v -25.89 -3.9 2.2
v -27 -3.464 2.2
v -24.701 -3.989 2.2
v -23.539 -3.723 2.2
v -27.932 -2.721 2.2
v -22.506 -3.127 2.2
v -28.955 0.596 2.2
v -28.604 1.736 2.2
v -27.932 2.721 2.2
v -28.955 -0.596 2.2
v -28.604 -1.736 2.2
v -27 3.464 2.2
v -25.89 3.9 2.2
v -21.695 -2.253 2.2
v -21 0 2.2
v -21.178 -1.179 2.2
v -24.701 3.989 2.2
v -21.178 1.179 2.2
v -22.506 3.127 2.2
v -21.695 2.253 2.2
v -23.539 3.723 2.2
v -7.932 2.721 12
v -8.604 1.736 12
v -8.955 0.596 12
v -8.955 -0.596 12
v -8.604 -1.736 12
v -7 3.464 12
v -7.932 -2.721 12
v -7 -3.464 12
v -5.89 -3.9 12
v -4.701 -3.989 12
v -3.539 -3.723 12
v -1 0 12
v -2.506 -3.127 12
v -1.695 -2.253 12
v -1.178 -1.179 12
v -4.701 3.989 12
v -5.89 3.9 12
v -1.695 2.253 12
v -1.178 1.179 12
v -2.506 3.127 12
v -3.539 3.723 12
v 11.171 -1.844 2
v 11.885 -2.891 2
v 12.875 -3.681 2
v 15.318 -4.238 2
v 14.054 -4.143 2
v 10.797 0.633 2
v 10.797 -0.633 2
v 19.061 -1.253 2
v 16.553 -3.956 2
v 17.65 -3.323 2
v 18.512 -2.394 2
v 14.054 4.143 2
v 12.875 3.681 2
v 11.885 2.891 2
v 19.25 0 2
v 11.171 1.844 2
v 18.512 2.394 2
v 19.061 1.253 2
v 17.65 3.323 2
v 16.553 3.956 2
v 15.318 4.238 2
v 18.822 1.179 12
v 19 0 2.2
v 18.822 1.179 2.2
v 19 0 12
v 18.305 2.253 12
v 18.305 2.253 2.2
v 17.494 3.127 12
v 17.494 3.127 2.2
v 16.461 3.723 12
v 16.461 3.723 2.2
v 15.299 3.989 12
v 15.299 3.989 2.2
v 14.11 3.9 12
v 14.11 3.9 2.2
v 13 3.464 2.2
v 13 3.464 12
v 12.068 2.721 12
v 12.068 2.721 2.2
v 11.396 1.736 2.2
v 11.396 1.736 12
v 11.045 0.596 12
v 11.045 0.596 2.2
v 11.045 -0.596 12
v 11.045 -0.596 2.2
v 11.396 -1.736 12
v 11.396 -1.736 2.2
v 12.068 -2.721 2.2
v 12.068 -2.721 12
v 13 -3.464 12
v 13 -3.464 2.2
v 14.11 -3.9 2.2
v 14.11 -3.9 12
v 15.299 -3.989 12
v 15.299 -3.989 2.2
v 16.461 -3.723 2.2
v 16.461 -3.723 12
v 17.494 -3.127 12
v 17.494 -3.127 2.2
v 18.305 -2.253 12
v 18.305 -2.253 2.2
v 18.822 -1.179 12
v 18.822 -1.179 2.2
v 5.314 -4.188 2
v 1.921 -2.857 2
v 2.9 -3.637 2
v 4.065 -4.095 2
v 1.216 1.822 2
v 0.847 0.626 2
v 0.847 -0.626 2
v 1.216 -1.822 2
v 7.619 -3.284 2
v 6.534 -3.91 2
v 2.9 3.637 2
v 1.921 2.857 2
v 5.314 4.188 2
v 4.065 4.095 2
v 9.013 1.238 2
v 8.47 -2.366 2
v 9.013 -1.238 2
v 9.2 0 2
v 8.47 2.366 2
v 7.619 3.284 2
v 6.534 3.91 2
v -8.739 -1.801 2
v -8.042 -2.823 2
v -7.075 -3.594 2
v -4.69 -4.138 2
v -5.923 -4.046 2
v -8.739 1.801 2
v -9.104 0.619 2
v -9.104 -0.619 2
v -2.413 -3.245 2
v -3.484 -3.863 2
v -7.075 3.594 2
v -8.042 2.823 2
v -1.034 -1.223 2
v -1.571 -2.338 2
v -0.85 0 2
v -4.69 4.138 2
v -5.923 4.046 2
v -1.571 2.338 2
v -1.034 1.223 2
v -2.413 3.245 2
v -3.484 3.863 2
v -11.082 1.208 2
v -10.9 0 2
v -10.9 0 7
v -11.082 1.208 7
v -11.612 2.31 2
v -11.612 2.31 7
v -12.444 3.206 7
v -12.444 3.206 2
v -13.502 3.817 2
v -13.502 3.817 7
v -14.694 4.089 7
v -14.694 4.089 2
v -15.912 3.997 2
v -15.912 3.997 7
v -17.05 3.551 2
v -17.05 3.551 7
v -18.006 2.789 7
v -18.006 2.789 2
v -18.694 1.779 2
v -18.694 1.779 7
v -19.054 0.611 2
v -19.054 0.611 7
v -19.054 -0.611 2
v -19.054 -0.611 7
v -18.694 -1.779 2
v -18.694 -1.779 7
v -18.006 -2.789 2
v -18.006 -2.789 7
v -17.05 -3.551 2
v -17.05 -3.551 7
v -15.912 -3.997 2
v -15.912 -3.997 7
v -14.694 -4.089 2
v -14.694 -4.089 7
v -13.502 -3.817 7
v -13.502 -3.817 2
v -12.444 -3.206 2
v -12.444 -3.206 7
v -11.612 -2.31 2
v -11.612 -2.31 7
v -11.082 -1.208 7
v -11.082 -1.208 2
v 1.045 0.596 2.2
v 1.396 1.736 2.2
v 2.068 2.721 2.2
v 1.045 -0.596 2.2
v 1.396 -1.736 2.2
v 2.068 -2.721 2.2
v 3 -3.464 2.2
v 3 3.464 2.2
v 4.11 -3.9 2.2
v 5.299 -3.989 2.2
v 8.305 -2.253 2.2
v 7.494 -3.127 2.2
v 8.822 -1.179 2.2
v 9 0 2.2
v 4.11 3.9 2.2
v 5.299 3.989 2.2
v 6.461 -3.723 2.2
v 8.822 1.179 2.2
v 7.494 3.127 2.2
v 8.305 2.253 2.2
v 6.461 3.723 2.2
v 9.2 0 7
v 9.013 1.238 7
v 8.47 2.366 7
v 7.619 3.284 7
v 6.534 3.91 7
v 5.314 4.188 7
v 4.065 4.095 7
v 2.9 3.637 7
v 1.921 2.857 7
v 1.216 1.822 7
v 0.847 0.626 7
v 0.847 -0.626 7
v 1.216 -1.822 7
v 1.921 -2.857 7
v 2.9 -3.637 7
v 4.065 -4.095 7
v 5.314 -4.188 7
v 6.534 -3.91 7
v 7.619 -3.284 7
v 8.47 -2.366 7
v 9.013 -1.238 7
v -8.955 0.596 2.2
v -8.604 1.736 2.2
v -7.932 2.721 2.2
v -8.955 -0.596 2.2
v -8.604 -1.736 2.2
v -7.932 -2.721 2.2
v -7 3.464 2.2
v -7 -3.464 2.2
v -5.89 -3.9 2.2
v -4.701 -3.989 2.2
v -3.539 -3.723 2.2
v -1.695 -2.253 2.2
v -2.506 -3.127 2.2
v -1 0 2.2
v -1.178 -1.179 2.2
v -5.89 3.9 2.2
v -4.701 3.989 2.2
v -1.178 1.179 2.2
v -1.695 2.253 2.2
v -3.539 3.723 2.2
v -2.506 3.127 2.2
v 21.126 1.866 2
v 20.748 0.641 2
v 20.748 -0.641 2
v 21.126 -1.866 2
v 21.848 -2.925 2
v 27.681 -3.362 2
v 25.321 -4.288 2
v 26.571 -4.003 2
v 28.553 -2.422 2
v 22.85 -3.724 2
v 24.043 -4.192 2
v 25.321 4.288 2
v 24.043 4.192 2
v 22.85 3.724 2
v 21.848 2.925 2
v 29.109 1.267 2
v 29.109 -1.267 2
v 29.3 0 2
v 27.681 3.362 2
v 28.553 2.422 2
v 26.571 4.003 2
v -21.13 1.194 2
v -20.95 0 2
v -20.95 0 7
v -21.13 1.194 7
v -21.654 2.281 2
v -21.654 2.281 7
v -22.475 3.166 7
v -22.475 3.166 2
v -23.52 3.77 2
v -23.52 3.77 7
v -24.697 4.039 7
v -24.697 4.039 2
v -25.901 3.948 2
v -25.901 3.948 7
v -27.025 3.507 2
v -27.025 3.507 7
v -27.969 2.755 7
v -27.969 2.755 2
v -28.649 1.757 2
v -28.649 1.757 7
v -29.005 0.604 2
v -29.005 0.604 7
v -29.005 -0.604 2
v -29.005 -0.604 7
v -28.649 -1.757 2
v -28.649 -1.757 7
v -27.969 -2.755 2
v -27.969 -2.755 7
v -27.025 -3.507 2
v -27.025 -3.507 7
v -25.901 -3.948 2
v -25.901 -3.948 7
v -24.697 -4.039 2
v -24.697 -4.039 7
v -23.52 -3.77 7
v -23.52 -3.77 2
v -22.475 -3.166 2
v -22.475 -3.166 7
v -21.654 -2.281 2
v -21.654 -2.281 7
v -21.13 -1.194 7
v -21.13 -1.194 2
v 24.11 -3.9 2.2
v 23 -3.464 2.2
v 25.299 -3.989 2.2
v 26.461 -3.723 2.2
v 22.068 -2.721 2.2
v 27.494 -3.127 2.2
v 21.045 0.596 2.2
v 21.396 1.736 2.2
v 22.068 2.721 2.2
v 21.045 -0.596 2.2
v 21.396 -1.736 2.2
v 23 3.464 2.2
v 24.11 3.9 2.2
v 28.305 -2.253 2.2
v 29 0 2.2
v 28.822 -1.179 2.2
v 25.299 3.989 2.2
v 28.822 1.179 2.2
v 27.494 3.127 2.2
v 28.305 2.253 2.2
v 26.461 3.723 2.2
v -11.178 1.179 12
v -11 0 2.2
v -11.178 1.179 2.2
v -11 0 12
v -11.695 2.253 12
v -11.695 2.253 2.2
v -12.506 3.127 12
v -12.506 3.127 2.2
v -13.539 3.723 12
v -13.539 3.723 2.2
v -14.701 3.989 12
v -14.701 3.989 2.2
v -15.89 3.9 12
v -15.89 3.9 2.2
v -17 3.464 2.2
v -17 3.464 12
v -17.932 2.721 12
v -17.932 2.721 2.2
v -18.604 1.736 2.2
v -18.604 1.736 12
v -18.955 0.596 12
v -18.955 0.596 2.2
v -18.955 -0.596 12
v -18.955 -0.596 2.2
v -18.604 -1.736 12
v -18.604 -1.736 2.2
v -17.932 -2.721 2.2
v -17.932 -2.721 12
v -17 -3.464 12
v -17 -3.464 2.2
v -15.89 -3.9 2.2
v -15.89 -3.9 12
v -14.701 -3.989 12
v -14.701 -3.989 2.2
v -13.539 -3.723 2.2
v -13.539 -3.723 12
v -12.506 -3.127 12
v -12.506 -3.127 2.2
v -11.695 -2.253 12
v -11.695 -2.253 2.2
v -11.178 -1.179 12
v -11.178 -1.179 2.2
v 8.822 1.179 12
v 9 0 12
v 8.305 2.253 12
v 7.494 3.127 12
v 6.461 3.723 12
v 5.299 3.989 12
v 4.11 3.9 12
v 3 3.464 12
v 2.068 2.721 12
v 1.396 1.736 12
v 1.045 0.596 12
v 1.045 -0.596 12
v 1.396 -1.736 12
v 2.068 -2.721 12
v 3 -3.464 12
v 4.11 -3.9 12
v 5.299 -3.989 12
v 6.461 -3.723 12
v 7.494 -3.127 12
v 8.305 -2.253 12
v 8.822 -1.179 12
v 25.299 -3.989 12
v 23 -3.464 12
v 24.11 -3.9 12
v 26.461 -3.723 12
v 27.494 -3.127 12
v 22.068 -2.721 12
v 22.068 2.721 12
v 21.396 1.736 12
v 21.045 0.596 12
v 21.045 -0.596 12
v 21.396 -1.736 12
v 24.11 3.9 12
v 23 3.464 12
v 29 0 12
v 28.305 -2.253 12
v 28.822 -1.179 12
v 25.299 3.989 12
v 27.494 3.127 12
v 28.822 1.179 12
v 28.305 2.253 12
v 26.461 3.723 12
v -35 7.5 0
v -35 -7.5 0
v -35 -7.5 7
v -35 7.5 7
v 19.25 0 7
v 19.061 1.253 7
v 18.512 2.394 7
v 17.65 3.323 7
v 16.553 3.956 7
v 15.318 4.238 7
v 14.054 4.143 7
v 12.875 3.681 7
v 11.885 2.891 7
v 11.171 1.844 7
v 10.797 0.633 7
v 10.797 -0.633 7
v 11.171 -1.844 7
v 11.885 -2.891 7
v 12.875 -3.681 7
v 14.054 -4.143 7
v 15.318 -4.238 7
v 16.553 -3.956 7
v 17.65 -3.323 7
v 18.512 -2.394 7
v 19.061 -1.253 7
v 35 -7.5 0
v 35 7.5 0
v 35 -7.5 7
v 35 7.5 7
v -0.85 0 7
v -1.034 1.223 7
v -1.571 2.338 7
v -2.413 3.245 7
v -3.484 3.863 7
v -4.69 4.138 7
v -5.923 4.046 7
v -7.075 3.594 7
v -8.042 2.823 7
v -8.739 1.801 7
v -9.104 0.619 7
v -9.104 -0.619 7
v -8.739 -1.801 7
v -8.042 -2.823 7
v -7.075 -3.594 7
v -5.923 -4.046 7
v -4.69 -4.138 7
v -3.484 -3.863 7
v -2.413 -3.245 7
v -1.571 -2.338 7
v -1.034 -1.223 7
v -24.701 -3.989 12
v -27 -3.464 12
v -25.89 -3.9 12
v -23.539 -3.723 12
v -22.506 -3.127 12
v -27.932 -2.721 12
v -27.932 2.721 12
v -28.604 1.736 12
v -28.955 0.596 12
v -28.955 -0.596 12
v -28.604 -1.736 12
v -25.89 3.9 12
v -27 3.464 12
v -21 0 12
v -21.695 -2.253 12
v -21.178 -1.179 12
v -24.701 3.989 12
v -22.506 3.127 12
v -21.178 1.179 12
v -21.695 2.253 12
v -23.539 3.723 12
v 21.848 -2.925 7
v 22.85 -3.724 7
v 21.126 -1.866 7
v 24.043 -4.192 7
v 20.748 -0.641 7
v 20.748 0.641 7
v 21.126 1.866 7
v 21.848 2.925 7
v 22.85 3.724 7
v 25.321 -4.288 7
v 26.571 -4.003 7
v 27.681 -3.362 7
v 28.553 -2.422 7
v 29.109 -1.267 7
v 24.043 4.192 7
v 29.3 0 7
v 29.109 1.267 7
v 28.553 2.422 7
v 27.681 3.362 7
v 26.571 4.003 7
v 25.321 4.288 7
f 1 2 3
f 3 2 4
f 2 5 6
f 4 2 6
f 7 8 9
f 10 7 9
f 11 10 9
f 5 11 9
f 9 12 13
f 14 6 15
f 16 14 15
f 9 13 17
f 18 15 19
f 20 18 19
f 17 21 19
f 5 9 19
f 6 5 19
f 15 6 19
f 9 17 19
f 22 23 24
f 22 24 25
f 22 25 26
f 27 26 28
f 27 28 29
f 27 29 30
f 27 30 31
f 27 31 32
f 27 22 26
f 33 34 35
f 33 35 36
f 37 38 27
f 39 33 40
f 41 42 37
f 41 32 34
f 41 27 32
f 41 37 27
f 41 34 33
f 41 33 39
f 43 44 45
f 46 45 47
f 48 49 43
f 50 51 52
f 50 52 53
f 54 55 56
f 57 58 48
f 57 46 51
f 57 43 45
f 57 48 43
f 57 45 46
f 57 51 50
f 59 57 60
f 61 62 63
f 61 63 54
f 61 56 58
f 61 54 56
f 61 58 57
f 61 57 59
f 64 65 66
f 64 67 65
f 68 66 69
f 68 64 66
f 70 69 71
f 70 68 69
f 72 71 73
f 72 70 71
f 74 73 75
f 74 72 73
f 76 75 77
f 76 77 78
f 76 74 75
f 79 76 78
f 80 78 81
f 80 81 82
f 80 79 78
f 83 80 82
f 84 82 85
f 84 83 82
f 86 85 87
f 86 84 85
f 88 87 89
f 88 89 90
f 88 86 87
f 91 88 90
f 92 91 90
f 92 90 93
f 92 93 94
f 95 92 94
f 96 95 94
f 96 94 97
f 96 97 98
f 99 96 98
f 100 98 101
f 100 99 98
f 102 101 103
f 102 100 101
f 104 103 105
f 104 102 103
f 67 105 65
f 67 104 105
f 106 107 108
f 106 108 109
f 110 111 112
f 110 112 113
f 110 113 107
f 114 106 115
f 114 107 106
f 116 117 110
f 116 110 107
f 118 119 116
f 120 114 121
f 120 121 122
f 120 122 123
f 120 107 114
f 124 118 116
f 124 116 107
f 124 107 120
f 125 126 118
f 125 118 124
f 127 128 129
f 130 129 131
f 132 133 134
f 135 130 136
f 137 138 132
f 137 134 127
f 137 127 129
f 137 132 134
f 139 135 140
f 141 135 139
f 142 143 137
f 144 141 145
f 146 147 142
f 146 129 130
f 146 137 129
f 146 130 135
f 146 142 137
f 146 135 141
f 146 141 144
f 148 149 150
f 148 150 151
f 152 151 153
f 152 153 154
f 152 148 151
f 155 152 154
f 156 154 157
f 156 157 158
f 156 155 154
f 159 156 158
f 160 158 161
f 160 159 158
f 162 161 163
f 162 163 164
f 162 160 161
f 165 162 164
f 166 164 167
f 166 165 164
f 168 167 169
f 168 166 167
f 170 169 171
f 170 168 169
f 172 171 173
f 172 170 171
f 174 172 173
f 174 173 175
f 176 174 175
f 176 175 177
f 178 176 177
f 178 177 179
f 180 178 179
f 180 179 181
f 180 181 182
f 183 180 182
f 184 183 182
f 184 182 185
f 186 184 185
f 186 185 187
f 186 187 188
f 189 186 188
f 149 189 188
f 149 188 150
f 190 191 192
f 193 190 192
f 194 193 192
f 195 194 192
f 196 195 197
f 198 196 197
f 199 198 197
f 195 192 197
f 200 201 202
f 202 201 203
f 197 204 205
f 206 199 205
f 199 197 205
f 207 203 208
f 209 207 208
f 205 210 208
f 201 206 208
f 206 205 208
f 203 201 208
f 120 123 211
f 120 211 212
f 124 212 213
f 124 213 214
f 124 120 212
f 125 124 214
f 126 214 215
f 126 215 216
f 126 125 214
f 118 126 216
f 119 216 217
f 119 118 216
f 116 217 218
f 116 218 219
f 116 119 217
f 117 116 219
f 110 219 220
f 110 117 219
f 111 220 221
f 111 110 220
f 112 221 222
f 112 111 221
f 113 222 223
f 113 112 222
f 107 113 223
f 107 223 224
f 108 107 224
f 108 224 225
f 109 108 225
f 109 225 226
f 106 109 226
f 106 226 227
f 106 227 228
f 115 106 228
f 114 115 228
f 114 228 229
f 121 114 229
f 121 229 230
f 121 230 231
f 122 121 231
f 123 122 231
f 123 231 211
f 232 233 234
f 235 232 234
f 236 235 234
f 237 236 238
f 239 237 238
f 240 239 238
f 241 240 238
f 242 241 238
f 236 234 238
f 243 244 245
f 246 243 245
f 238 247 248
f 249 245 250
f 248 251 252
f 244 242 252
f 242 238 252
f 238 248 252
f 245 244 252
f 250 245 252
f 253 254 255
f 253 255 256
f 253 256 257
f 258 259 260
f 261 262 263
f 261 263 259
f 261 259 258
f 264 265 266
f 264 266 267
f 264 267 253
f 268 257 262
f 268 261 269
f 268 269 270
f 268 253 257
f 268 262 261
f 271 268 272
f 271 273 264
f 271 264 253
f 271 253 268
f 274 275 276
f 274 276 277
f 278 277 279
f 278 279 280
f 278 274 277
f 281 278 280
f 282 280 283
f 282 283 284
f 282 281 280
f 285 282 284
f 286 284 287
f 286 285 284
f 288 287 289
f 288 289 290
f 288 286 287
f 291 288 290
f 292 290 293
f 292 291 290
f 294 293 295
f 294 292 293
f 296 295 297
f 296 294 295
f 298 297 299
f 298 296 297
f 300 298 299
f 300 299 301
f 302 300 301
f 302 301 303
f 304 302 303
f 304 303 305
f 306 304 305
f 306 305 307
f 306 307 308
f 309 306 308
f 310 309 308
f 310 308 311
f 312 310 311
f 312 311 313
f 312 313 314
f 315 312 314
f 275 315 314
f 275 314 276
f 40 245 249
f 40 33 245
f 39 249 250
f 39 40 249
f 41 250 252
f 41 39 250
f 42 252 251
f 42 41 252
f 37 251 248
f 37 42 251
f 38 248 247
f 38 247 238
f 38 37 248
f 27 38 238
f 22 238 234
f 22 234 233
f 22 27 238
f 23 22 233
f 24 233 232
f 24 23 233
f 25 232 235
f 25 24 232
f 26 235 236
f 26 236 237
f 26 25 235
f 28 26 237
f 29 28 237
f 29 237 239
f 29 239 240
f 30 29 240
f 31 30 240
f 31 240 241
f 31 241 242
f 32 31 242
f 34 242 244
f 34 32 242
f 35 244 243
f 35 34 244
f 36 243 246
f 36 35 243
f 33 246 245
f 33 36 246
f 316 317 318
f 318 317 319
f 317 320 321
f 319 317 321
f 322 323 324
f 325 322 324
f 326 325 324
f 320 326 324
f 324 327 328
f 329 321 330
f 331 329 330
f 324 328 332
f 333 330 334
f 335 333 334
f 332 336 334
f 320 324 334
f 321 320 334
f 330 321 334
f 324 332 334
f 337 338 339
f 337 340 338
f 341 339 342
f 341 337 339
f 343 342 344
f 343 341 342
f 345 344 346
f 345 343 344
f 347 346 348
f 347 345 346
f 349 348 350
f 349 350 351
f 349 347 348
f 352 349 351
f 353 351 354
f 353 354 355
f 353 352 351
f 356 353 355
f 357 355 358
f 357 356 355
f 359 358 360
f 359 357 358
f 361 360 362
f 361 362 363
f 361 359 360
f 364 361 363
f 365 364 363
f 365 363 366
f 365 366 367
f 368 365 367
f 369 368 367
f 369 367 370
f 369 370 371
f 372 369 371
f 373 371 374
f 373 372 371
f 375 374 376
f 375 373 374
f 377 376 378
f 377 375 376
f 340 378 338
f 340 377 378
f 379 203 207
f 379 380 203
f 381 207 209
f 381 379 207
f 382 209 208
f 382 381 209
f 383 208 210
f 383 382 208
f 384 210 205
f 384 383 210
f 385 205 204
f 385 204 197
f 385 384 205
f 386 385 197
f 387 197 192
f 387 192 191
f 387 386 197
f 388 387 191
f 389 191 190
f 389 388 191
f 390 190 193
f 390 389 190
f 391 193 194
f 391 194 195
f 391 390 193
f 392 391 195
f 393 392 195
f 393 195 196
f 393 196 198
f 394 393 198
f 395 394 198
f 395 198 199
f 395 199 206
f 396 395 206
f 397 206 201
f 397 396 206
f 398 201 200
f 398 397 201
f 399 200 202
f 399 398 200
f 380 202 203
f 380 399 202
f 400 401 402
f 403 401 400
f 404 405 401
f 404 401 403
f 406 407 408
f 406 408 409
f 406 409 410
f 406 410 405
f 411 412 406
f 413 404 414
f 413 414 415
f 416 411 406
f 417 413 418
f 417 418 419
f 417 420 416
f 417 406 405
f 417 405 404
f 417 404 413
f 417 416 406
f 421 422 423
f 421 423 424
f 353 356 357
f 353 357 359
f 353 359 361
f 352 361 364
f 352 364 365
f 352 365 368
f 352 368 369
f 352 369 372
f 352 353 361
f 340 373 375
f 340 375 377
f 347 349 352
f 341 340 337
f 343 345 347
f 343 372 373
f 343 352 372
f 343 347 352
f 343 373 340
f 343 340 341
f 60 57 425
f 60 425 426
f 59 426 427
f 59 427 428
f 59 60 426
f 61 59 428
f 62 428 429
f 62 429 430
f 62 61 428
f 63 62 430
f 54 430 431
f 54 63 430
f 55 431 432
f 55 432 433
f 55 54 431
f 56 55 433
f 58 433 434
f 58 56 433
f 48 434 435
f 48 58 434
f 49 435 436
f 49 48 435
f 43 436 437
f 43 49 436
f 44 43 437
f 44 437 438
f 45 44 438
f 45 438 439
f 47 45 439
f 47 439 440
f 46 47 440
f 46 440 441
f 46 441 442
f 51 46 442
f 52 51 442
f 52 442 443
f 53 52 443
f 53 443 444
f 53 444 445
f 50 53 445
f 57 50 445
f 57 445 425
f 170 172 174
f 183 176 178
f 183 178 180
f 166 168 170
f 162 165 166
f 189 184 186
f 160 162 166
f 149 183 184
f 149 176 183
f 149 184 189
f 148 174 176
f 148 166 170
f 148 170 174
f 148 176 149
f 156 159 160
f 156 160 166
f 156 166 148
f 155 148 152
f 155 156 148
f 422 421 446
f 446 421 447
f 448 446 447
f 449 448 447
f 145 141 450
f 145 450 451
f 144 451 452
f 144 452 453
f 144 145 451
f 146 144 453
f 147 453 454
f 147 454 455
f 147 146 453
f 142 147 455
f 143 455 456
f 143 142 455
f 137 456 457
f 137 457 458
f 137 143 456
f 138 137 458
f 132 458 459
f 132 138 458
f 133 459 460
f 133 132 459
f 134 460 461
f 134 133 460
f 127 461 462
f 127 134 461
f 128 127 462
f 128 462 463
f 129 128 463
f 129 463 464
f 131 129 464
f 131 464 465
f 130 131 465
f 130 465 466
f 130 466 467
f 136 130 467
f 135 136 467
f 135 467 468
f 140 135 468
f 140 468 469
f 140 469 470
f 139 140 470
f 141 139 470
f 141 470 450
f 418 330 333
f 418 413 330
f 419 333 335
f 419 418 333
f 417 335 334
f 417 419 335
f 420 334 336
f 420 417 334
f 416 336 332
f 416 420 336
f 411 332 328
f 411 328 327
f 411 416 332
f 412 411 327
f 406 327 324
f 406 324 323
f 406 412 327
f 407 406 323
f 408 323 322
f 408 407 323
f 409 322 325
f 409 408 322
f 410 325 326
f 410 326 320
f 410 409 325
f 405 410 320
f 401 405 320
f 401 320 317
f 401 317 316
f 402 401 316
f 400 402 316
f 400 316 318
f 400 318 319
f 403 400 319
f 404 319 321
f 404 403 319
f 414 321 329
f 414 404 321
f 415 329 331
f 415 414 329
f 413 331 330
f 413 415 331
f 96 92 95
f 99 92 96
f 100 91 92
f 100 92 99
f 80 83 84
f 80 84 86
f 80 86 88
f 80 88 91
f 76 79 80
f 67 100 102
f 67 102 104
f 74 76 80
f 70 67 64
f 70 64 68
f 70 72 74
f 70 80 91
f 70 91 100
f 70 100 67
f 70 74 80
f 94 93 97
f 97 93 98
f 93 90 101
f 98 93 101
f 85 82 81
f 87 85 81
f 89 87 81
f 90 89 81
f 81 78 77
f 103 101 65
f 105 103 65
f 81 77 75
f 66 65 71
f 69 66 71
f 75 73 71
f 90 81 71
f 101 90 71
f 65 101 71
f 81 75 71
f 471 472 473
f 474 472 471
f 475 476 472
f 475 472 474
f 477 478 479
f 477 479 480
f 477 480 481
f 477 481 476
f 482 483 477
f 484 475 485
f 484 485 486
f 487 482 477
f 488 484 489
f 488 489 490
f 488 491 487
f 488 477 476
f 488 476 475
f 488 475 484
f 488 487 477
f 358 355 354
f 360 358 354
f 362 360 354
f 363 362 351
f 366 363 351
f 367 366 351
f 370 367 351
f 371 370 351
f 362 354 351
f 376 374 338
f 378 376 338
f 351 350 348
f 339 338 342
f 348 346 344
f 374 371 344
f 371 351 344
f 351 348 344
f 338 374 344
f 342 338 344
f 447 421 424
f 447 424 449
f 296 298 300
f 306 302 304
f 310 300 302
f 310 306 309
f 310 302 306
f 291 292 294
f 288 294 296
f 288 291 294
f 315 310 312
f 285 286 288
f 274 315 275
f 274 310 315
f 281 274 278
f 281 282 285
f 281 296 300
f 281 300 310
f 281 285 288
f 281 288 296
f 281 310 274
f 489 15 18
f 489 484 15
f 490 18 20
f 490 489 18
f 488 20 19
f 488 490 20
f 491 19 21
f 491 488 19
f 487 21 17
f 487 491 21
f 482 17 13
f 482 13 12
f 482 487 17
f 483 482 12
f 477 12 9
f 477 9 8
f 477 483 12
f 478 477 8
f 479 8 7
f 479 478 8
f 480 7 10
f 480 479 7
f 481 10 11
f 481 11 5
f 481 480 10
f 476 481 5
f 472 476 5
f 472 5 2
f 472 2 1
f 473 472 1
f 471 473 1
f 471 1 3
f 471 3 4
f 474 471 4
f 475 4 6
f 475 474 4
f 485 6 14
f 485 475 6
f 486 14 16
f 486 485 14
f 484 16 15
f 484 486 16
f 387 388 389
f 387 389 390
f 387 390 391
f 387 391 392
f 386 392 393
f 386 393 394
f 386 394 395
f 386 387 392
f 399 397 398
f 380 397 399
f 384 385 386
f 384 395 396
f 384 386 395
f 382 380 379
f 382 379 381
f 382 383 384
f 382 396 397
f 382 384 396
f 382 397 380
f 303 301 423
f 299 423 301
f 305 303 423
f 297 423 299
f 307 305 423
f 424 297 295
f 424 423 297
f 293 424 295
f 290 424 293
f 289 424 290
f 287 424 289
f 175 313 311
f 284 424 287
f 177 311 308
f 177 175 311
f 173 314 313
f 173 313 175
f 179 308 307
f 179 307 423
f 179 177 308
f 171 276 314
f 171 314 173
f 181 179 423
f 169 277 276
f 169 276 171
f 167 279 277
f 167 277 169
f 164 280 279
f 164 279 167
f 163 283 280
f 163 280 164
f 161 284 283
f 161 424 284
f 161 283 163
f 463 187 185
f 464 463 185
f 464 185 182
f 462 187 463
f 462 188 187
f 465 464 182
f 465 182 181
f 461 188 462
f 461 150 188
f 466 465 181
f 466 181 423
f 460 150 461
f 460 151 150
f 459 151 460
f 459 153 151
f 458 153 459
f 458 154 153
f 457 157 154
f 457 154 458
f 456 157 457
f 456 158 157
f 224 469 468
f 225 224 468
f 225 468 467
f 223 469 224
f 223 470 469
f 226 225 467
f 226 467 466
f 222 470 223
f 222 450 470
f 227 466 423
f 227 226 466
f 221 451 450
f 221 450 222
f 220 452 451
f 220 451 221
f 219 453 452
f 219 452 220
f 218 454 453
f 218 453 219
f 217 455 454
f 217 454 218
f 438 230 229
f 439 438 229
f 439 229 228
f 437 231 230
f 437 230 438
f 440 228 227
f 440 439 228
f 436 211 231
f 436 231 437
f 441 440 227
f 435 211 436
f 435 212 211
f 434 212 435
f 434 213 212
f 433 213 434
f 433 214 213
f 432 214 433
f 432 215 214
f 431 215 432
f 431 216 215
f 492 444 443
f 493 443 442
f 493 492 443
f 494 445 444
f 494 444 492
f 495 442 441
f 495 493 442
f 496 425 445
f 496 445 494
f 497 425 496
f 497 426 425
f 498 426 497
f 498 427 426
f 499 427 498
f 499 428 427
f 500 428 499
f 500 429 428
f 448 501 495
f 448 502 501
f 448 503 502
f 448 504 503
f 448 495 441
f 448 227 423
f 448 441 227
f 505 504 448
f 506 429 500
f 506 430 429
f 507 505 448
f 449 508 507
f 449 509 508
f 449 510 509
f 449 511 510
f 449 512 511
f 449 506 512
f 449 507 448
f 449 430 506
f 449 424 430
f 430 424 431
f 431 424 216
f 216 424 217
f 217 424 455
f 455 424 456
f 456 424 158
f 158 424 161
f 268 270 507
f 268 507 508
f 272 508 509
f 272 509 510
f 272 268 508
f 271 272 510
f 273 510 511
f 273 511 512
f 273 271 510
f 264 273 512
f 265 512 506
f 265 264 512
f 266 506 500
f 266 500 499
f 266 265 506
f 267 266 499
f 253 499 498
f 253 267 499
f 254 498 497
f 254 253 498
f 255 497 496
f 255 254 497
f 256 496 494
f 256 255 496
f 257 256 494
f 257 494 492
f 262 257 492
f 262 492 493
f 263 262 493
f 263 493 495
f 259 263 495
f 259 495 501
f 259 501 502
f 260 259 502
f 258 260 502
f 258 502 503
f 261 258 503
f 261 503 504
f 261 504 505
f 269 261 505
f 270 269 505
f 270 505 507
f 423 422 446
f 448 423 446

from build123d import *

# Parameters (mm, degrees)
F0_W          = 70
F0_H          = 15
F0_R          = 4.05
F0_R_2        = 4.1
F0_R_3        = 4.15
F0_R_4        = 4.2
F0_R_5        = 4.25
F0_R_6        = 4.3
F1_DEPTH      = 7
F2_DEPTH      = 2
F3_R          = 4
F4_DEPTH      = 5
F4_DEPTH_BACK = 4.8


with BuildPart() as f1:
    # F0 (on Top) → F1 (new body)
    with BuildSketch(Plane.XY):
        Rectangle(F0_W, F0_H)
        with Locations((-25, 0)):
            Circle(F0_R, mode=Mode.SUBTRACT)
        with Locations((-15, 0)):
            Circle(F0_R_2, mode=Mode.SUBTRACT)
        with Locations((-5, 0)):
            Circle(F0_R_3, mode=Mode.SUBTRACT)
        with Locations((5, 0)):
            Circle(F0_R_4, mode=Mode.SUBTRACT)
        with Locations((15, 0)):
            Circle(F0_R_5, mode=Mode.SUBTRACT)
        with Locations((25, 0)):
            Circle(F0_R_6, mode=Mode.SUBTRACT)
    extrude(amount=F1_DEPTH)

    # F0 (on Top) → F2 (join)
    with BuildSketch(Plane.XY):
        with Locations((-25, 0)):
            Circle(F0_R)
        with Locations((-15, 0)):
            Circle(F0_R_2)
        with Locations((-5, 0)):
            Circle(F0_R_3)
        with Locations((5, 0)):
            Circle(F0_R_4)
        with Locations((15, 0)):
            Circle(F0_R_5)
        with Locations((25, 0)):
            Circle(F0_R_6)
    extrude(amount=F2_DEPTH)


with BuildPart() as f4:
    # F3 (on face) → F4 (new body, two sides)
    with BuildSketch(Plane.XY.offset(7)) as f4_sk:
        with Locations((-25, 0)):
            Circle(F3_R)
        with Locations((-15, 0)):
            Circle(F3_R)
        with Locations((-5, 0)):
            Circle(F3_R)
        with Locations((5, 0)):
            Circle(F3_R)
        with Locations((15, 0)):
            Circle(F3_R)
        with Locations((25, 0)):
            Circle(F3_R)
    extrude(amount=F4_DEPTH)
    extrude(f4_sk.sketch, amount=-F4_DEPTH_BACK)


solid = Compound([f1.part, f4.part])
